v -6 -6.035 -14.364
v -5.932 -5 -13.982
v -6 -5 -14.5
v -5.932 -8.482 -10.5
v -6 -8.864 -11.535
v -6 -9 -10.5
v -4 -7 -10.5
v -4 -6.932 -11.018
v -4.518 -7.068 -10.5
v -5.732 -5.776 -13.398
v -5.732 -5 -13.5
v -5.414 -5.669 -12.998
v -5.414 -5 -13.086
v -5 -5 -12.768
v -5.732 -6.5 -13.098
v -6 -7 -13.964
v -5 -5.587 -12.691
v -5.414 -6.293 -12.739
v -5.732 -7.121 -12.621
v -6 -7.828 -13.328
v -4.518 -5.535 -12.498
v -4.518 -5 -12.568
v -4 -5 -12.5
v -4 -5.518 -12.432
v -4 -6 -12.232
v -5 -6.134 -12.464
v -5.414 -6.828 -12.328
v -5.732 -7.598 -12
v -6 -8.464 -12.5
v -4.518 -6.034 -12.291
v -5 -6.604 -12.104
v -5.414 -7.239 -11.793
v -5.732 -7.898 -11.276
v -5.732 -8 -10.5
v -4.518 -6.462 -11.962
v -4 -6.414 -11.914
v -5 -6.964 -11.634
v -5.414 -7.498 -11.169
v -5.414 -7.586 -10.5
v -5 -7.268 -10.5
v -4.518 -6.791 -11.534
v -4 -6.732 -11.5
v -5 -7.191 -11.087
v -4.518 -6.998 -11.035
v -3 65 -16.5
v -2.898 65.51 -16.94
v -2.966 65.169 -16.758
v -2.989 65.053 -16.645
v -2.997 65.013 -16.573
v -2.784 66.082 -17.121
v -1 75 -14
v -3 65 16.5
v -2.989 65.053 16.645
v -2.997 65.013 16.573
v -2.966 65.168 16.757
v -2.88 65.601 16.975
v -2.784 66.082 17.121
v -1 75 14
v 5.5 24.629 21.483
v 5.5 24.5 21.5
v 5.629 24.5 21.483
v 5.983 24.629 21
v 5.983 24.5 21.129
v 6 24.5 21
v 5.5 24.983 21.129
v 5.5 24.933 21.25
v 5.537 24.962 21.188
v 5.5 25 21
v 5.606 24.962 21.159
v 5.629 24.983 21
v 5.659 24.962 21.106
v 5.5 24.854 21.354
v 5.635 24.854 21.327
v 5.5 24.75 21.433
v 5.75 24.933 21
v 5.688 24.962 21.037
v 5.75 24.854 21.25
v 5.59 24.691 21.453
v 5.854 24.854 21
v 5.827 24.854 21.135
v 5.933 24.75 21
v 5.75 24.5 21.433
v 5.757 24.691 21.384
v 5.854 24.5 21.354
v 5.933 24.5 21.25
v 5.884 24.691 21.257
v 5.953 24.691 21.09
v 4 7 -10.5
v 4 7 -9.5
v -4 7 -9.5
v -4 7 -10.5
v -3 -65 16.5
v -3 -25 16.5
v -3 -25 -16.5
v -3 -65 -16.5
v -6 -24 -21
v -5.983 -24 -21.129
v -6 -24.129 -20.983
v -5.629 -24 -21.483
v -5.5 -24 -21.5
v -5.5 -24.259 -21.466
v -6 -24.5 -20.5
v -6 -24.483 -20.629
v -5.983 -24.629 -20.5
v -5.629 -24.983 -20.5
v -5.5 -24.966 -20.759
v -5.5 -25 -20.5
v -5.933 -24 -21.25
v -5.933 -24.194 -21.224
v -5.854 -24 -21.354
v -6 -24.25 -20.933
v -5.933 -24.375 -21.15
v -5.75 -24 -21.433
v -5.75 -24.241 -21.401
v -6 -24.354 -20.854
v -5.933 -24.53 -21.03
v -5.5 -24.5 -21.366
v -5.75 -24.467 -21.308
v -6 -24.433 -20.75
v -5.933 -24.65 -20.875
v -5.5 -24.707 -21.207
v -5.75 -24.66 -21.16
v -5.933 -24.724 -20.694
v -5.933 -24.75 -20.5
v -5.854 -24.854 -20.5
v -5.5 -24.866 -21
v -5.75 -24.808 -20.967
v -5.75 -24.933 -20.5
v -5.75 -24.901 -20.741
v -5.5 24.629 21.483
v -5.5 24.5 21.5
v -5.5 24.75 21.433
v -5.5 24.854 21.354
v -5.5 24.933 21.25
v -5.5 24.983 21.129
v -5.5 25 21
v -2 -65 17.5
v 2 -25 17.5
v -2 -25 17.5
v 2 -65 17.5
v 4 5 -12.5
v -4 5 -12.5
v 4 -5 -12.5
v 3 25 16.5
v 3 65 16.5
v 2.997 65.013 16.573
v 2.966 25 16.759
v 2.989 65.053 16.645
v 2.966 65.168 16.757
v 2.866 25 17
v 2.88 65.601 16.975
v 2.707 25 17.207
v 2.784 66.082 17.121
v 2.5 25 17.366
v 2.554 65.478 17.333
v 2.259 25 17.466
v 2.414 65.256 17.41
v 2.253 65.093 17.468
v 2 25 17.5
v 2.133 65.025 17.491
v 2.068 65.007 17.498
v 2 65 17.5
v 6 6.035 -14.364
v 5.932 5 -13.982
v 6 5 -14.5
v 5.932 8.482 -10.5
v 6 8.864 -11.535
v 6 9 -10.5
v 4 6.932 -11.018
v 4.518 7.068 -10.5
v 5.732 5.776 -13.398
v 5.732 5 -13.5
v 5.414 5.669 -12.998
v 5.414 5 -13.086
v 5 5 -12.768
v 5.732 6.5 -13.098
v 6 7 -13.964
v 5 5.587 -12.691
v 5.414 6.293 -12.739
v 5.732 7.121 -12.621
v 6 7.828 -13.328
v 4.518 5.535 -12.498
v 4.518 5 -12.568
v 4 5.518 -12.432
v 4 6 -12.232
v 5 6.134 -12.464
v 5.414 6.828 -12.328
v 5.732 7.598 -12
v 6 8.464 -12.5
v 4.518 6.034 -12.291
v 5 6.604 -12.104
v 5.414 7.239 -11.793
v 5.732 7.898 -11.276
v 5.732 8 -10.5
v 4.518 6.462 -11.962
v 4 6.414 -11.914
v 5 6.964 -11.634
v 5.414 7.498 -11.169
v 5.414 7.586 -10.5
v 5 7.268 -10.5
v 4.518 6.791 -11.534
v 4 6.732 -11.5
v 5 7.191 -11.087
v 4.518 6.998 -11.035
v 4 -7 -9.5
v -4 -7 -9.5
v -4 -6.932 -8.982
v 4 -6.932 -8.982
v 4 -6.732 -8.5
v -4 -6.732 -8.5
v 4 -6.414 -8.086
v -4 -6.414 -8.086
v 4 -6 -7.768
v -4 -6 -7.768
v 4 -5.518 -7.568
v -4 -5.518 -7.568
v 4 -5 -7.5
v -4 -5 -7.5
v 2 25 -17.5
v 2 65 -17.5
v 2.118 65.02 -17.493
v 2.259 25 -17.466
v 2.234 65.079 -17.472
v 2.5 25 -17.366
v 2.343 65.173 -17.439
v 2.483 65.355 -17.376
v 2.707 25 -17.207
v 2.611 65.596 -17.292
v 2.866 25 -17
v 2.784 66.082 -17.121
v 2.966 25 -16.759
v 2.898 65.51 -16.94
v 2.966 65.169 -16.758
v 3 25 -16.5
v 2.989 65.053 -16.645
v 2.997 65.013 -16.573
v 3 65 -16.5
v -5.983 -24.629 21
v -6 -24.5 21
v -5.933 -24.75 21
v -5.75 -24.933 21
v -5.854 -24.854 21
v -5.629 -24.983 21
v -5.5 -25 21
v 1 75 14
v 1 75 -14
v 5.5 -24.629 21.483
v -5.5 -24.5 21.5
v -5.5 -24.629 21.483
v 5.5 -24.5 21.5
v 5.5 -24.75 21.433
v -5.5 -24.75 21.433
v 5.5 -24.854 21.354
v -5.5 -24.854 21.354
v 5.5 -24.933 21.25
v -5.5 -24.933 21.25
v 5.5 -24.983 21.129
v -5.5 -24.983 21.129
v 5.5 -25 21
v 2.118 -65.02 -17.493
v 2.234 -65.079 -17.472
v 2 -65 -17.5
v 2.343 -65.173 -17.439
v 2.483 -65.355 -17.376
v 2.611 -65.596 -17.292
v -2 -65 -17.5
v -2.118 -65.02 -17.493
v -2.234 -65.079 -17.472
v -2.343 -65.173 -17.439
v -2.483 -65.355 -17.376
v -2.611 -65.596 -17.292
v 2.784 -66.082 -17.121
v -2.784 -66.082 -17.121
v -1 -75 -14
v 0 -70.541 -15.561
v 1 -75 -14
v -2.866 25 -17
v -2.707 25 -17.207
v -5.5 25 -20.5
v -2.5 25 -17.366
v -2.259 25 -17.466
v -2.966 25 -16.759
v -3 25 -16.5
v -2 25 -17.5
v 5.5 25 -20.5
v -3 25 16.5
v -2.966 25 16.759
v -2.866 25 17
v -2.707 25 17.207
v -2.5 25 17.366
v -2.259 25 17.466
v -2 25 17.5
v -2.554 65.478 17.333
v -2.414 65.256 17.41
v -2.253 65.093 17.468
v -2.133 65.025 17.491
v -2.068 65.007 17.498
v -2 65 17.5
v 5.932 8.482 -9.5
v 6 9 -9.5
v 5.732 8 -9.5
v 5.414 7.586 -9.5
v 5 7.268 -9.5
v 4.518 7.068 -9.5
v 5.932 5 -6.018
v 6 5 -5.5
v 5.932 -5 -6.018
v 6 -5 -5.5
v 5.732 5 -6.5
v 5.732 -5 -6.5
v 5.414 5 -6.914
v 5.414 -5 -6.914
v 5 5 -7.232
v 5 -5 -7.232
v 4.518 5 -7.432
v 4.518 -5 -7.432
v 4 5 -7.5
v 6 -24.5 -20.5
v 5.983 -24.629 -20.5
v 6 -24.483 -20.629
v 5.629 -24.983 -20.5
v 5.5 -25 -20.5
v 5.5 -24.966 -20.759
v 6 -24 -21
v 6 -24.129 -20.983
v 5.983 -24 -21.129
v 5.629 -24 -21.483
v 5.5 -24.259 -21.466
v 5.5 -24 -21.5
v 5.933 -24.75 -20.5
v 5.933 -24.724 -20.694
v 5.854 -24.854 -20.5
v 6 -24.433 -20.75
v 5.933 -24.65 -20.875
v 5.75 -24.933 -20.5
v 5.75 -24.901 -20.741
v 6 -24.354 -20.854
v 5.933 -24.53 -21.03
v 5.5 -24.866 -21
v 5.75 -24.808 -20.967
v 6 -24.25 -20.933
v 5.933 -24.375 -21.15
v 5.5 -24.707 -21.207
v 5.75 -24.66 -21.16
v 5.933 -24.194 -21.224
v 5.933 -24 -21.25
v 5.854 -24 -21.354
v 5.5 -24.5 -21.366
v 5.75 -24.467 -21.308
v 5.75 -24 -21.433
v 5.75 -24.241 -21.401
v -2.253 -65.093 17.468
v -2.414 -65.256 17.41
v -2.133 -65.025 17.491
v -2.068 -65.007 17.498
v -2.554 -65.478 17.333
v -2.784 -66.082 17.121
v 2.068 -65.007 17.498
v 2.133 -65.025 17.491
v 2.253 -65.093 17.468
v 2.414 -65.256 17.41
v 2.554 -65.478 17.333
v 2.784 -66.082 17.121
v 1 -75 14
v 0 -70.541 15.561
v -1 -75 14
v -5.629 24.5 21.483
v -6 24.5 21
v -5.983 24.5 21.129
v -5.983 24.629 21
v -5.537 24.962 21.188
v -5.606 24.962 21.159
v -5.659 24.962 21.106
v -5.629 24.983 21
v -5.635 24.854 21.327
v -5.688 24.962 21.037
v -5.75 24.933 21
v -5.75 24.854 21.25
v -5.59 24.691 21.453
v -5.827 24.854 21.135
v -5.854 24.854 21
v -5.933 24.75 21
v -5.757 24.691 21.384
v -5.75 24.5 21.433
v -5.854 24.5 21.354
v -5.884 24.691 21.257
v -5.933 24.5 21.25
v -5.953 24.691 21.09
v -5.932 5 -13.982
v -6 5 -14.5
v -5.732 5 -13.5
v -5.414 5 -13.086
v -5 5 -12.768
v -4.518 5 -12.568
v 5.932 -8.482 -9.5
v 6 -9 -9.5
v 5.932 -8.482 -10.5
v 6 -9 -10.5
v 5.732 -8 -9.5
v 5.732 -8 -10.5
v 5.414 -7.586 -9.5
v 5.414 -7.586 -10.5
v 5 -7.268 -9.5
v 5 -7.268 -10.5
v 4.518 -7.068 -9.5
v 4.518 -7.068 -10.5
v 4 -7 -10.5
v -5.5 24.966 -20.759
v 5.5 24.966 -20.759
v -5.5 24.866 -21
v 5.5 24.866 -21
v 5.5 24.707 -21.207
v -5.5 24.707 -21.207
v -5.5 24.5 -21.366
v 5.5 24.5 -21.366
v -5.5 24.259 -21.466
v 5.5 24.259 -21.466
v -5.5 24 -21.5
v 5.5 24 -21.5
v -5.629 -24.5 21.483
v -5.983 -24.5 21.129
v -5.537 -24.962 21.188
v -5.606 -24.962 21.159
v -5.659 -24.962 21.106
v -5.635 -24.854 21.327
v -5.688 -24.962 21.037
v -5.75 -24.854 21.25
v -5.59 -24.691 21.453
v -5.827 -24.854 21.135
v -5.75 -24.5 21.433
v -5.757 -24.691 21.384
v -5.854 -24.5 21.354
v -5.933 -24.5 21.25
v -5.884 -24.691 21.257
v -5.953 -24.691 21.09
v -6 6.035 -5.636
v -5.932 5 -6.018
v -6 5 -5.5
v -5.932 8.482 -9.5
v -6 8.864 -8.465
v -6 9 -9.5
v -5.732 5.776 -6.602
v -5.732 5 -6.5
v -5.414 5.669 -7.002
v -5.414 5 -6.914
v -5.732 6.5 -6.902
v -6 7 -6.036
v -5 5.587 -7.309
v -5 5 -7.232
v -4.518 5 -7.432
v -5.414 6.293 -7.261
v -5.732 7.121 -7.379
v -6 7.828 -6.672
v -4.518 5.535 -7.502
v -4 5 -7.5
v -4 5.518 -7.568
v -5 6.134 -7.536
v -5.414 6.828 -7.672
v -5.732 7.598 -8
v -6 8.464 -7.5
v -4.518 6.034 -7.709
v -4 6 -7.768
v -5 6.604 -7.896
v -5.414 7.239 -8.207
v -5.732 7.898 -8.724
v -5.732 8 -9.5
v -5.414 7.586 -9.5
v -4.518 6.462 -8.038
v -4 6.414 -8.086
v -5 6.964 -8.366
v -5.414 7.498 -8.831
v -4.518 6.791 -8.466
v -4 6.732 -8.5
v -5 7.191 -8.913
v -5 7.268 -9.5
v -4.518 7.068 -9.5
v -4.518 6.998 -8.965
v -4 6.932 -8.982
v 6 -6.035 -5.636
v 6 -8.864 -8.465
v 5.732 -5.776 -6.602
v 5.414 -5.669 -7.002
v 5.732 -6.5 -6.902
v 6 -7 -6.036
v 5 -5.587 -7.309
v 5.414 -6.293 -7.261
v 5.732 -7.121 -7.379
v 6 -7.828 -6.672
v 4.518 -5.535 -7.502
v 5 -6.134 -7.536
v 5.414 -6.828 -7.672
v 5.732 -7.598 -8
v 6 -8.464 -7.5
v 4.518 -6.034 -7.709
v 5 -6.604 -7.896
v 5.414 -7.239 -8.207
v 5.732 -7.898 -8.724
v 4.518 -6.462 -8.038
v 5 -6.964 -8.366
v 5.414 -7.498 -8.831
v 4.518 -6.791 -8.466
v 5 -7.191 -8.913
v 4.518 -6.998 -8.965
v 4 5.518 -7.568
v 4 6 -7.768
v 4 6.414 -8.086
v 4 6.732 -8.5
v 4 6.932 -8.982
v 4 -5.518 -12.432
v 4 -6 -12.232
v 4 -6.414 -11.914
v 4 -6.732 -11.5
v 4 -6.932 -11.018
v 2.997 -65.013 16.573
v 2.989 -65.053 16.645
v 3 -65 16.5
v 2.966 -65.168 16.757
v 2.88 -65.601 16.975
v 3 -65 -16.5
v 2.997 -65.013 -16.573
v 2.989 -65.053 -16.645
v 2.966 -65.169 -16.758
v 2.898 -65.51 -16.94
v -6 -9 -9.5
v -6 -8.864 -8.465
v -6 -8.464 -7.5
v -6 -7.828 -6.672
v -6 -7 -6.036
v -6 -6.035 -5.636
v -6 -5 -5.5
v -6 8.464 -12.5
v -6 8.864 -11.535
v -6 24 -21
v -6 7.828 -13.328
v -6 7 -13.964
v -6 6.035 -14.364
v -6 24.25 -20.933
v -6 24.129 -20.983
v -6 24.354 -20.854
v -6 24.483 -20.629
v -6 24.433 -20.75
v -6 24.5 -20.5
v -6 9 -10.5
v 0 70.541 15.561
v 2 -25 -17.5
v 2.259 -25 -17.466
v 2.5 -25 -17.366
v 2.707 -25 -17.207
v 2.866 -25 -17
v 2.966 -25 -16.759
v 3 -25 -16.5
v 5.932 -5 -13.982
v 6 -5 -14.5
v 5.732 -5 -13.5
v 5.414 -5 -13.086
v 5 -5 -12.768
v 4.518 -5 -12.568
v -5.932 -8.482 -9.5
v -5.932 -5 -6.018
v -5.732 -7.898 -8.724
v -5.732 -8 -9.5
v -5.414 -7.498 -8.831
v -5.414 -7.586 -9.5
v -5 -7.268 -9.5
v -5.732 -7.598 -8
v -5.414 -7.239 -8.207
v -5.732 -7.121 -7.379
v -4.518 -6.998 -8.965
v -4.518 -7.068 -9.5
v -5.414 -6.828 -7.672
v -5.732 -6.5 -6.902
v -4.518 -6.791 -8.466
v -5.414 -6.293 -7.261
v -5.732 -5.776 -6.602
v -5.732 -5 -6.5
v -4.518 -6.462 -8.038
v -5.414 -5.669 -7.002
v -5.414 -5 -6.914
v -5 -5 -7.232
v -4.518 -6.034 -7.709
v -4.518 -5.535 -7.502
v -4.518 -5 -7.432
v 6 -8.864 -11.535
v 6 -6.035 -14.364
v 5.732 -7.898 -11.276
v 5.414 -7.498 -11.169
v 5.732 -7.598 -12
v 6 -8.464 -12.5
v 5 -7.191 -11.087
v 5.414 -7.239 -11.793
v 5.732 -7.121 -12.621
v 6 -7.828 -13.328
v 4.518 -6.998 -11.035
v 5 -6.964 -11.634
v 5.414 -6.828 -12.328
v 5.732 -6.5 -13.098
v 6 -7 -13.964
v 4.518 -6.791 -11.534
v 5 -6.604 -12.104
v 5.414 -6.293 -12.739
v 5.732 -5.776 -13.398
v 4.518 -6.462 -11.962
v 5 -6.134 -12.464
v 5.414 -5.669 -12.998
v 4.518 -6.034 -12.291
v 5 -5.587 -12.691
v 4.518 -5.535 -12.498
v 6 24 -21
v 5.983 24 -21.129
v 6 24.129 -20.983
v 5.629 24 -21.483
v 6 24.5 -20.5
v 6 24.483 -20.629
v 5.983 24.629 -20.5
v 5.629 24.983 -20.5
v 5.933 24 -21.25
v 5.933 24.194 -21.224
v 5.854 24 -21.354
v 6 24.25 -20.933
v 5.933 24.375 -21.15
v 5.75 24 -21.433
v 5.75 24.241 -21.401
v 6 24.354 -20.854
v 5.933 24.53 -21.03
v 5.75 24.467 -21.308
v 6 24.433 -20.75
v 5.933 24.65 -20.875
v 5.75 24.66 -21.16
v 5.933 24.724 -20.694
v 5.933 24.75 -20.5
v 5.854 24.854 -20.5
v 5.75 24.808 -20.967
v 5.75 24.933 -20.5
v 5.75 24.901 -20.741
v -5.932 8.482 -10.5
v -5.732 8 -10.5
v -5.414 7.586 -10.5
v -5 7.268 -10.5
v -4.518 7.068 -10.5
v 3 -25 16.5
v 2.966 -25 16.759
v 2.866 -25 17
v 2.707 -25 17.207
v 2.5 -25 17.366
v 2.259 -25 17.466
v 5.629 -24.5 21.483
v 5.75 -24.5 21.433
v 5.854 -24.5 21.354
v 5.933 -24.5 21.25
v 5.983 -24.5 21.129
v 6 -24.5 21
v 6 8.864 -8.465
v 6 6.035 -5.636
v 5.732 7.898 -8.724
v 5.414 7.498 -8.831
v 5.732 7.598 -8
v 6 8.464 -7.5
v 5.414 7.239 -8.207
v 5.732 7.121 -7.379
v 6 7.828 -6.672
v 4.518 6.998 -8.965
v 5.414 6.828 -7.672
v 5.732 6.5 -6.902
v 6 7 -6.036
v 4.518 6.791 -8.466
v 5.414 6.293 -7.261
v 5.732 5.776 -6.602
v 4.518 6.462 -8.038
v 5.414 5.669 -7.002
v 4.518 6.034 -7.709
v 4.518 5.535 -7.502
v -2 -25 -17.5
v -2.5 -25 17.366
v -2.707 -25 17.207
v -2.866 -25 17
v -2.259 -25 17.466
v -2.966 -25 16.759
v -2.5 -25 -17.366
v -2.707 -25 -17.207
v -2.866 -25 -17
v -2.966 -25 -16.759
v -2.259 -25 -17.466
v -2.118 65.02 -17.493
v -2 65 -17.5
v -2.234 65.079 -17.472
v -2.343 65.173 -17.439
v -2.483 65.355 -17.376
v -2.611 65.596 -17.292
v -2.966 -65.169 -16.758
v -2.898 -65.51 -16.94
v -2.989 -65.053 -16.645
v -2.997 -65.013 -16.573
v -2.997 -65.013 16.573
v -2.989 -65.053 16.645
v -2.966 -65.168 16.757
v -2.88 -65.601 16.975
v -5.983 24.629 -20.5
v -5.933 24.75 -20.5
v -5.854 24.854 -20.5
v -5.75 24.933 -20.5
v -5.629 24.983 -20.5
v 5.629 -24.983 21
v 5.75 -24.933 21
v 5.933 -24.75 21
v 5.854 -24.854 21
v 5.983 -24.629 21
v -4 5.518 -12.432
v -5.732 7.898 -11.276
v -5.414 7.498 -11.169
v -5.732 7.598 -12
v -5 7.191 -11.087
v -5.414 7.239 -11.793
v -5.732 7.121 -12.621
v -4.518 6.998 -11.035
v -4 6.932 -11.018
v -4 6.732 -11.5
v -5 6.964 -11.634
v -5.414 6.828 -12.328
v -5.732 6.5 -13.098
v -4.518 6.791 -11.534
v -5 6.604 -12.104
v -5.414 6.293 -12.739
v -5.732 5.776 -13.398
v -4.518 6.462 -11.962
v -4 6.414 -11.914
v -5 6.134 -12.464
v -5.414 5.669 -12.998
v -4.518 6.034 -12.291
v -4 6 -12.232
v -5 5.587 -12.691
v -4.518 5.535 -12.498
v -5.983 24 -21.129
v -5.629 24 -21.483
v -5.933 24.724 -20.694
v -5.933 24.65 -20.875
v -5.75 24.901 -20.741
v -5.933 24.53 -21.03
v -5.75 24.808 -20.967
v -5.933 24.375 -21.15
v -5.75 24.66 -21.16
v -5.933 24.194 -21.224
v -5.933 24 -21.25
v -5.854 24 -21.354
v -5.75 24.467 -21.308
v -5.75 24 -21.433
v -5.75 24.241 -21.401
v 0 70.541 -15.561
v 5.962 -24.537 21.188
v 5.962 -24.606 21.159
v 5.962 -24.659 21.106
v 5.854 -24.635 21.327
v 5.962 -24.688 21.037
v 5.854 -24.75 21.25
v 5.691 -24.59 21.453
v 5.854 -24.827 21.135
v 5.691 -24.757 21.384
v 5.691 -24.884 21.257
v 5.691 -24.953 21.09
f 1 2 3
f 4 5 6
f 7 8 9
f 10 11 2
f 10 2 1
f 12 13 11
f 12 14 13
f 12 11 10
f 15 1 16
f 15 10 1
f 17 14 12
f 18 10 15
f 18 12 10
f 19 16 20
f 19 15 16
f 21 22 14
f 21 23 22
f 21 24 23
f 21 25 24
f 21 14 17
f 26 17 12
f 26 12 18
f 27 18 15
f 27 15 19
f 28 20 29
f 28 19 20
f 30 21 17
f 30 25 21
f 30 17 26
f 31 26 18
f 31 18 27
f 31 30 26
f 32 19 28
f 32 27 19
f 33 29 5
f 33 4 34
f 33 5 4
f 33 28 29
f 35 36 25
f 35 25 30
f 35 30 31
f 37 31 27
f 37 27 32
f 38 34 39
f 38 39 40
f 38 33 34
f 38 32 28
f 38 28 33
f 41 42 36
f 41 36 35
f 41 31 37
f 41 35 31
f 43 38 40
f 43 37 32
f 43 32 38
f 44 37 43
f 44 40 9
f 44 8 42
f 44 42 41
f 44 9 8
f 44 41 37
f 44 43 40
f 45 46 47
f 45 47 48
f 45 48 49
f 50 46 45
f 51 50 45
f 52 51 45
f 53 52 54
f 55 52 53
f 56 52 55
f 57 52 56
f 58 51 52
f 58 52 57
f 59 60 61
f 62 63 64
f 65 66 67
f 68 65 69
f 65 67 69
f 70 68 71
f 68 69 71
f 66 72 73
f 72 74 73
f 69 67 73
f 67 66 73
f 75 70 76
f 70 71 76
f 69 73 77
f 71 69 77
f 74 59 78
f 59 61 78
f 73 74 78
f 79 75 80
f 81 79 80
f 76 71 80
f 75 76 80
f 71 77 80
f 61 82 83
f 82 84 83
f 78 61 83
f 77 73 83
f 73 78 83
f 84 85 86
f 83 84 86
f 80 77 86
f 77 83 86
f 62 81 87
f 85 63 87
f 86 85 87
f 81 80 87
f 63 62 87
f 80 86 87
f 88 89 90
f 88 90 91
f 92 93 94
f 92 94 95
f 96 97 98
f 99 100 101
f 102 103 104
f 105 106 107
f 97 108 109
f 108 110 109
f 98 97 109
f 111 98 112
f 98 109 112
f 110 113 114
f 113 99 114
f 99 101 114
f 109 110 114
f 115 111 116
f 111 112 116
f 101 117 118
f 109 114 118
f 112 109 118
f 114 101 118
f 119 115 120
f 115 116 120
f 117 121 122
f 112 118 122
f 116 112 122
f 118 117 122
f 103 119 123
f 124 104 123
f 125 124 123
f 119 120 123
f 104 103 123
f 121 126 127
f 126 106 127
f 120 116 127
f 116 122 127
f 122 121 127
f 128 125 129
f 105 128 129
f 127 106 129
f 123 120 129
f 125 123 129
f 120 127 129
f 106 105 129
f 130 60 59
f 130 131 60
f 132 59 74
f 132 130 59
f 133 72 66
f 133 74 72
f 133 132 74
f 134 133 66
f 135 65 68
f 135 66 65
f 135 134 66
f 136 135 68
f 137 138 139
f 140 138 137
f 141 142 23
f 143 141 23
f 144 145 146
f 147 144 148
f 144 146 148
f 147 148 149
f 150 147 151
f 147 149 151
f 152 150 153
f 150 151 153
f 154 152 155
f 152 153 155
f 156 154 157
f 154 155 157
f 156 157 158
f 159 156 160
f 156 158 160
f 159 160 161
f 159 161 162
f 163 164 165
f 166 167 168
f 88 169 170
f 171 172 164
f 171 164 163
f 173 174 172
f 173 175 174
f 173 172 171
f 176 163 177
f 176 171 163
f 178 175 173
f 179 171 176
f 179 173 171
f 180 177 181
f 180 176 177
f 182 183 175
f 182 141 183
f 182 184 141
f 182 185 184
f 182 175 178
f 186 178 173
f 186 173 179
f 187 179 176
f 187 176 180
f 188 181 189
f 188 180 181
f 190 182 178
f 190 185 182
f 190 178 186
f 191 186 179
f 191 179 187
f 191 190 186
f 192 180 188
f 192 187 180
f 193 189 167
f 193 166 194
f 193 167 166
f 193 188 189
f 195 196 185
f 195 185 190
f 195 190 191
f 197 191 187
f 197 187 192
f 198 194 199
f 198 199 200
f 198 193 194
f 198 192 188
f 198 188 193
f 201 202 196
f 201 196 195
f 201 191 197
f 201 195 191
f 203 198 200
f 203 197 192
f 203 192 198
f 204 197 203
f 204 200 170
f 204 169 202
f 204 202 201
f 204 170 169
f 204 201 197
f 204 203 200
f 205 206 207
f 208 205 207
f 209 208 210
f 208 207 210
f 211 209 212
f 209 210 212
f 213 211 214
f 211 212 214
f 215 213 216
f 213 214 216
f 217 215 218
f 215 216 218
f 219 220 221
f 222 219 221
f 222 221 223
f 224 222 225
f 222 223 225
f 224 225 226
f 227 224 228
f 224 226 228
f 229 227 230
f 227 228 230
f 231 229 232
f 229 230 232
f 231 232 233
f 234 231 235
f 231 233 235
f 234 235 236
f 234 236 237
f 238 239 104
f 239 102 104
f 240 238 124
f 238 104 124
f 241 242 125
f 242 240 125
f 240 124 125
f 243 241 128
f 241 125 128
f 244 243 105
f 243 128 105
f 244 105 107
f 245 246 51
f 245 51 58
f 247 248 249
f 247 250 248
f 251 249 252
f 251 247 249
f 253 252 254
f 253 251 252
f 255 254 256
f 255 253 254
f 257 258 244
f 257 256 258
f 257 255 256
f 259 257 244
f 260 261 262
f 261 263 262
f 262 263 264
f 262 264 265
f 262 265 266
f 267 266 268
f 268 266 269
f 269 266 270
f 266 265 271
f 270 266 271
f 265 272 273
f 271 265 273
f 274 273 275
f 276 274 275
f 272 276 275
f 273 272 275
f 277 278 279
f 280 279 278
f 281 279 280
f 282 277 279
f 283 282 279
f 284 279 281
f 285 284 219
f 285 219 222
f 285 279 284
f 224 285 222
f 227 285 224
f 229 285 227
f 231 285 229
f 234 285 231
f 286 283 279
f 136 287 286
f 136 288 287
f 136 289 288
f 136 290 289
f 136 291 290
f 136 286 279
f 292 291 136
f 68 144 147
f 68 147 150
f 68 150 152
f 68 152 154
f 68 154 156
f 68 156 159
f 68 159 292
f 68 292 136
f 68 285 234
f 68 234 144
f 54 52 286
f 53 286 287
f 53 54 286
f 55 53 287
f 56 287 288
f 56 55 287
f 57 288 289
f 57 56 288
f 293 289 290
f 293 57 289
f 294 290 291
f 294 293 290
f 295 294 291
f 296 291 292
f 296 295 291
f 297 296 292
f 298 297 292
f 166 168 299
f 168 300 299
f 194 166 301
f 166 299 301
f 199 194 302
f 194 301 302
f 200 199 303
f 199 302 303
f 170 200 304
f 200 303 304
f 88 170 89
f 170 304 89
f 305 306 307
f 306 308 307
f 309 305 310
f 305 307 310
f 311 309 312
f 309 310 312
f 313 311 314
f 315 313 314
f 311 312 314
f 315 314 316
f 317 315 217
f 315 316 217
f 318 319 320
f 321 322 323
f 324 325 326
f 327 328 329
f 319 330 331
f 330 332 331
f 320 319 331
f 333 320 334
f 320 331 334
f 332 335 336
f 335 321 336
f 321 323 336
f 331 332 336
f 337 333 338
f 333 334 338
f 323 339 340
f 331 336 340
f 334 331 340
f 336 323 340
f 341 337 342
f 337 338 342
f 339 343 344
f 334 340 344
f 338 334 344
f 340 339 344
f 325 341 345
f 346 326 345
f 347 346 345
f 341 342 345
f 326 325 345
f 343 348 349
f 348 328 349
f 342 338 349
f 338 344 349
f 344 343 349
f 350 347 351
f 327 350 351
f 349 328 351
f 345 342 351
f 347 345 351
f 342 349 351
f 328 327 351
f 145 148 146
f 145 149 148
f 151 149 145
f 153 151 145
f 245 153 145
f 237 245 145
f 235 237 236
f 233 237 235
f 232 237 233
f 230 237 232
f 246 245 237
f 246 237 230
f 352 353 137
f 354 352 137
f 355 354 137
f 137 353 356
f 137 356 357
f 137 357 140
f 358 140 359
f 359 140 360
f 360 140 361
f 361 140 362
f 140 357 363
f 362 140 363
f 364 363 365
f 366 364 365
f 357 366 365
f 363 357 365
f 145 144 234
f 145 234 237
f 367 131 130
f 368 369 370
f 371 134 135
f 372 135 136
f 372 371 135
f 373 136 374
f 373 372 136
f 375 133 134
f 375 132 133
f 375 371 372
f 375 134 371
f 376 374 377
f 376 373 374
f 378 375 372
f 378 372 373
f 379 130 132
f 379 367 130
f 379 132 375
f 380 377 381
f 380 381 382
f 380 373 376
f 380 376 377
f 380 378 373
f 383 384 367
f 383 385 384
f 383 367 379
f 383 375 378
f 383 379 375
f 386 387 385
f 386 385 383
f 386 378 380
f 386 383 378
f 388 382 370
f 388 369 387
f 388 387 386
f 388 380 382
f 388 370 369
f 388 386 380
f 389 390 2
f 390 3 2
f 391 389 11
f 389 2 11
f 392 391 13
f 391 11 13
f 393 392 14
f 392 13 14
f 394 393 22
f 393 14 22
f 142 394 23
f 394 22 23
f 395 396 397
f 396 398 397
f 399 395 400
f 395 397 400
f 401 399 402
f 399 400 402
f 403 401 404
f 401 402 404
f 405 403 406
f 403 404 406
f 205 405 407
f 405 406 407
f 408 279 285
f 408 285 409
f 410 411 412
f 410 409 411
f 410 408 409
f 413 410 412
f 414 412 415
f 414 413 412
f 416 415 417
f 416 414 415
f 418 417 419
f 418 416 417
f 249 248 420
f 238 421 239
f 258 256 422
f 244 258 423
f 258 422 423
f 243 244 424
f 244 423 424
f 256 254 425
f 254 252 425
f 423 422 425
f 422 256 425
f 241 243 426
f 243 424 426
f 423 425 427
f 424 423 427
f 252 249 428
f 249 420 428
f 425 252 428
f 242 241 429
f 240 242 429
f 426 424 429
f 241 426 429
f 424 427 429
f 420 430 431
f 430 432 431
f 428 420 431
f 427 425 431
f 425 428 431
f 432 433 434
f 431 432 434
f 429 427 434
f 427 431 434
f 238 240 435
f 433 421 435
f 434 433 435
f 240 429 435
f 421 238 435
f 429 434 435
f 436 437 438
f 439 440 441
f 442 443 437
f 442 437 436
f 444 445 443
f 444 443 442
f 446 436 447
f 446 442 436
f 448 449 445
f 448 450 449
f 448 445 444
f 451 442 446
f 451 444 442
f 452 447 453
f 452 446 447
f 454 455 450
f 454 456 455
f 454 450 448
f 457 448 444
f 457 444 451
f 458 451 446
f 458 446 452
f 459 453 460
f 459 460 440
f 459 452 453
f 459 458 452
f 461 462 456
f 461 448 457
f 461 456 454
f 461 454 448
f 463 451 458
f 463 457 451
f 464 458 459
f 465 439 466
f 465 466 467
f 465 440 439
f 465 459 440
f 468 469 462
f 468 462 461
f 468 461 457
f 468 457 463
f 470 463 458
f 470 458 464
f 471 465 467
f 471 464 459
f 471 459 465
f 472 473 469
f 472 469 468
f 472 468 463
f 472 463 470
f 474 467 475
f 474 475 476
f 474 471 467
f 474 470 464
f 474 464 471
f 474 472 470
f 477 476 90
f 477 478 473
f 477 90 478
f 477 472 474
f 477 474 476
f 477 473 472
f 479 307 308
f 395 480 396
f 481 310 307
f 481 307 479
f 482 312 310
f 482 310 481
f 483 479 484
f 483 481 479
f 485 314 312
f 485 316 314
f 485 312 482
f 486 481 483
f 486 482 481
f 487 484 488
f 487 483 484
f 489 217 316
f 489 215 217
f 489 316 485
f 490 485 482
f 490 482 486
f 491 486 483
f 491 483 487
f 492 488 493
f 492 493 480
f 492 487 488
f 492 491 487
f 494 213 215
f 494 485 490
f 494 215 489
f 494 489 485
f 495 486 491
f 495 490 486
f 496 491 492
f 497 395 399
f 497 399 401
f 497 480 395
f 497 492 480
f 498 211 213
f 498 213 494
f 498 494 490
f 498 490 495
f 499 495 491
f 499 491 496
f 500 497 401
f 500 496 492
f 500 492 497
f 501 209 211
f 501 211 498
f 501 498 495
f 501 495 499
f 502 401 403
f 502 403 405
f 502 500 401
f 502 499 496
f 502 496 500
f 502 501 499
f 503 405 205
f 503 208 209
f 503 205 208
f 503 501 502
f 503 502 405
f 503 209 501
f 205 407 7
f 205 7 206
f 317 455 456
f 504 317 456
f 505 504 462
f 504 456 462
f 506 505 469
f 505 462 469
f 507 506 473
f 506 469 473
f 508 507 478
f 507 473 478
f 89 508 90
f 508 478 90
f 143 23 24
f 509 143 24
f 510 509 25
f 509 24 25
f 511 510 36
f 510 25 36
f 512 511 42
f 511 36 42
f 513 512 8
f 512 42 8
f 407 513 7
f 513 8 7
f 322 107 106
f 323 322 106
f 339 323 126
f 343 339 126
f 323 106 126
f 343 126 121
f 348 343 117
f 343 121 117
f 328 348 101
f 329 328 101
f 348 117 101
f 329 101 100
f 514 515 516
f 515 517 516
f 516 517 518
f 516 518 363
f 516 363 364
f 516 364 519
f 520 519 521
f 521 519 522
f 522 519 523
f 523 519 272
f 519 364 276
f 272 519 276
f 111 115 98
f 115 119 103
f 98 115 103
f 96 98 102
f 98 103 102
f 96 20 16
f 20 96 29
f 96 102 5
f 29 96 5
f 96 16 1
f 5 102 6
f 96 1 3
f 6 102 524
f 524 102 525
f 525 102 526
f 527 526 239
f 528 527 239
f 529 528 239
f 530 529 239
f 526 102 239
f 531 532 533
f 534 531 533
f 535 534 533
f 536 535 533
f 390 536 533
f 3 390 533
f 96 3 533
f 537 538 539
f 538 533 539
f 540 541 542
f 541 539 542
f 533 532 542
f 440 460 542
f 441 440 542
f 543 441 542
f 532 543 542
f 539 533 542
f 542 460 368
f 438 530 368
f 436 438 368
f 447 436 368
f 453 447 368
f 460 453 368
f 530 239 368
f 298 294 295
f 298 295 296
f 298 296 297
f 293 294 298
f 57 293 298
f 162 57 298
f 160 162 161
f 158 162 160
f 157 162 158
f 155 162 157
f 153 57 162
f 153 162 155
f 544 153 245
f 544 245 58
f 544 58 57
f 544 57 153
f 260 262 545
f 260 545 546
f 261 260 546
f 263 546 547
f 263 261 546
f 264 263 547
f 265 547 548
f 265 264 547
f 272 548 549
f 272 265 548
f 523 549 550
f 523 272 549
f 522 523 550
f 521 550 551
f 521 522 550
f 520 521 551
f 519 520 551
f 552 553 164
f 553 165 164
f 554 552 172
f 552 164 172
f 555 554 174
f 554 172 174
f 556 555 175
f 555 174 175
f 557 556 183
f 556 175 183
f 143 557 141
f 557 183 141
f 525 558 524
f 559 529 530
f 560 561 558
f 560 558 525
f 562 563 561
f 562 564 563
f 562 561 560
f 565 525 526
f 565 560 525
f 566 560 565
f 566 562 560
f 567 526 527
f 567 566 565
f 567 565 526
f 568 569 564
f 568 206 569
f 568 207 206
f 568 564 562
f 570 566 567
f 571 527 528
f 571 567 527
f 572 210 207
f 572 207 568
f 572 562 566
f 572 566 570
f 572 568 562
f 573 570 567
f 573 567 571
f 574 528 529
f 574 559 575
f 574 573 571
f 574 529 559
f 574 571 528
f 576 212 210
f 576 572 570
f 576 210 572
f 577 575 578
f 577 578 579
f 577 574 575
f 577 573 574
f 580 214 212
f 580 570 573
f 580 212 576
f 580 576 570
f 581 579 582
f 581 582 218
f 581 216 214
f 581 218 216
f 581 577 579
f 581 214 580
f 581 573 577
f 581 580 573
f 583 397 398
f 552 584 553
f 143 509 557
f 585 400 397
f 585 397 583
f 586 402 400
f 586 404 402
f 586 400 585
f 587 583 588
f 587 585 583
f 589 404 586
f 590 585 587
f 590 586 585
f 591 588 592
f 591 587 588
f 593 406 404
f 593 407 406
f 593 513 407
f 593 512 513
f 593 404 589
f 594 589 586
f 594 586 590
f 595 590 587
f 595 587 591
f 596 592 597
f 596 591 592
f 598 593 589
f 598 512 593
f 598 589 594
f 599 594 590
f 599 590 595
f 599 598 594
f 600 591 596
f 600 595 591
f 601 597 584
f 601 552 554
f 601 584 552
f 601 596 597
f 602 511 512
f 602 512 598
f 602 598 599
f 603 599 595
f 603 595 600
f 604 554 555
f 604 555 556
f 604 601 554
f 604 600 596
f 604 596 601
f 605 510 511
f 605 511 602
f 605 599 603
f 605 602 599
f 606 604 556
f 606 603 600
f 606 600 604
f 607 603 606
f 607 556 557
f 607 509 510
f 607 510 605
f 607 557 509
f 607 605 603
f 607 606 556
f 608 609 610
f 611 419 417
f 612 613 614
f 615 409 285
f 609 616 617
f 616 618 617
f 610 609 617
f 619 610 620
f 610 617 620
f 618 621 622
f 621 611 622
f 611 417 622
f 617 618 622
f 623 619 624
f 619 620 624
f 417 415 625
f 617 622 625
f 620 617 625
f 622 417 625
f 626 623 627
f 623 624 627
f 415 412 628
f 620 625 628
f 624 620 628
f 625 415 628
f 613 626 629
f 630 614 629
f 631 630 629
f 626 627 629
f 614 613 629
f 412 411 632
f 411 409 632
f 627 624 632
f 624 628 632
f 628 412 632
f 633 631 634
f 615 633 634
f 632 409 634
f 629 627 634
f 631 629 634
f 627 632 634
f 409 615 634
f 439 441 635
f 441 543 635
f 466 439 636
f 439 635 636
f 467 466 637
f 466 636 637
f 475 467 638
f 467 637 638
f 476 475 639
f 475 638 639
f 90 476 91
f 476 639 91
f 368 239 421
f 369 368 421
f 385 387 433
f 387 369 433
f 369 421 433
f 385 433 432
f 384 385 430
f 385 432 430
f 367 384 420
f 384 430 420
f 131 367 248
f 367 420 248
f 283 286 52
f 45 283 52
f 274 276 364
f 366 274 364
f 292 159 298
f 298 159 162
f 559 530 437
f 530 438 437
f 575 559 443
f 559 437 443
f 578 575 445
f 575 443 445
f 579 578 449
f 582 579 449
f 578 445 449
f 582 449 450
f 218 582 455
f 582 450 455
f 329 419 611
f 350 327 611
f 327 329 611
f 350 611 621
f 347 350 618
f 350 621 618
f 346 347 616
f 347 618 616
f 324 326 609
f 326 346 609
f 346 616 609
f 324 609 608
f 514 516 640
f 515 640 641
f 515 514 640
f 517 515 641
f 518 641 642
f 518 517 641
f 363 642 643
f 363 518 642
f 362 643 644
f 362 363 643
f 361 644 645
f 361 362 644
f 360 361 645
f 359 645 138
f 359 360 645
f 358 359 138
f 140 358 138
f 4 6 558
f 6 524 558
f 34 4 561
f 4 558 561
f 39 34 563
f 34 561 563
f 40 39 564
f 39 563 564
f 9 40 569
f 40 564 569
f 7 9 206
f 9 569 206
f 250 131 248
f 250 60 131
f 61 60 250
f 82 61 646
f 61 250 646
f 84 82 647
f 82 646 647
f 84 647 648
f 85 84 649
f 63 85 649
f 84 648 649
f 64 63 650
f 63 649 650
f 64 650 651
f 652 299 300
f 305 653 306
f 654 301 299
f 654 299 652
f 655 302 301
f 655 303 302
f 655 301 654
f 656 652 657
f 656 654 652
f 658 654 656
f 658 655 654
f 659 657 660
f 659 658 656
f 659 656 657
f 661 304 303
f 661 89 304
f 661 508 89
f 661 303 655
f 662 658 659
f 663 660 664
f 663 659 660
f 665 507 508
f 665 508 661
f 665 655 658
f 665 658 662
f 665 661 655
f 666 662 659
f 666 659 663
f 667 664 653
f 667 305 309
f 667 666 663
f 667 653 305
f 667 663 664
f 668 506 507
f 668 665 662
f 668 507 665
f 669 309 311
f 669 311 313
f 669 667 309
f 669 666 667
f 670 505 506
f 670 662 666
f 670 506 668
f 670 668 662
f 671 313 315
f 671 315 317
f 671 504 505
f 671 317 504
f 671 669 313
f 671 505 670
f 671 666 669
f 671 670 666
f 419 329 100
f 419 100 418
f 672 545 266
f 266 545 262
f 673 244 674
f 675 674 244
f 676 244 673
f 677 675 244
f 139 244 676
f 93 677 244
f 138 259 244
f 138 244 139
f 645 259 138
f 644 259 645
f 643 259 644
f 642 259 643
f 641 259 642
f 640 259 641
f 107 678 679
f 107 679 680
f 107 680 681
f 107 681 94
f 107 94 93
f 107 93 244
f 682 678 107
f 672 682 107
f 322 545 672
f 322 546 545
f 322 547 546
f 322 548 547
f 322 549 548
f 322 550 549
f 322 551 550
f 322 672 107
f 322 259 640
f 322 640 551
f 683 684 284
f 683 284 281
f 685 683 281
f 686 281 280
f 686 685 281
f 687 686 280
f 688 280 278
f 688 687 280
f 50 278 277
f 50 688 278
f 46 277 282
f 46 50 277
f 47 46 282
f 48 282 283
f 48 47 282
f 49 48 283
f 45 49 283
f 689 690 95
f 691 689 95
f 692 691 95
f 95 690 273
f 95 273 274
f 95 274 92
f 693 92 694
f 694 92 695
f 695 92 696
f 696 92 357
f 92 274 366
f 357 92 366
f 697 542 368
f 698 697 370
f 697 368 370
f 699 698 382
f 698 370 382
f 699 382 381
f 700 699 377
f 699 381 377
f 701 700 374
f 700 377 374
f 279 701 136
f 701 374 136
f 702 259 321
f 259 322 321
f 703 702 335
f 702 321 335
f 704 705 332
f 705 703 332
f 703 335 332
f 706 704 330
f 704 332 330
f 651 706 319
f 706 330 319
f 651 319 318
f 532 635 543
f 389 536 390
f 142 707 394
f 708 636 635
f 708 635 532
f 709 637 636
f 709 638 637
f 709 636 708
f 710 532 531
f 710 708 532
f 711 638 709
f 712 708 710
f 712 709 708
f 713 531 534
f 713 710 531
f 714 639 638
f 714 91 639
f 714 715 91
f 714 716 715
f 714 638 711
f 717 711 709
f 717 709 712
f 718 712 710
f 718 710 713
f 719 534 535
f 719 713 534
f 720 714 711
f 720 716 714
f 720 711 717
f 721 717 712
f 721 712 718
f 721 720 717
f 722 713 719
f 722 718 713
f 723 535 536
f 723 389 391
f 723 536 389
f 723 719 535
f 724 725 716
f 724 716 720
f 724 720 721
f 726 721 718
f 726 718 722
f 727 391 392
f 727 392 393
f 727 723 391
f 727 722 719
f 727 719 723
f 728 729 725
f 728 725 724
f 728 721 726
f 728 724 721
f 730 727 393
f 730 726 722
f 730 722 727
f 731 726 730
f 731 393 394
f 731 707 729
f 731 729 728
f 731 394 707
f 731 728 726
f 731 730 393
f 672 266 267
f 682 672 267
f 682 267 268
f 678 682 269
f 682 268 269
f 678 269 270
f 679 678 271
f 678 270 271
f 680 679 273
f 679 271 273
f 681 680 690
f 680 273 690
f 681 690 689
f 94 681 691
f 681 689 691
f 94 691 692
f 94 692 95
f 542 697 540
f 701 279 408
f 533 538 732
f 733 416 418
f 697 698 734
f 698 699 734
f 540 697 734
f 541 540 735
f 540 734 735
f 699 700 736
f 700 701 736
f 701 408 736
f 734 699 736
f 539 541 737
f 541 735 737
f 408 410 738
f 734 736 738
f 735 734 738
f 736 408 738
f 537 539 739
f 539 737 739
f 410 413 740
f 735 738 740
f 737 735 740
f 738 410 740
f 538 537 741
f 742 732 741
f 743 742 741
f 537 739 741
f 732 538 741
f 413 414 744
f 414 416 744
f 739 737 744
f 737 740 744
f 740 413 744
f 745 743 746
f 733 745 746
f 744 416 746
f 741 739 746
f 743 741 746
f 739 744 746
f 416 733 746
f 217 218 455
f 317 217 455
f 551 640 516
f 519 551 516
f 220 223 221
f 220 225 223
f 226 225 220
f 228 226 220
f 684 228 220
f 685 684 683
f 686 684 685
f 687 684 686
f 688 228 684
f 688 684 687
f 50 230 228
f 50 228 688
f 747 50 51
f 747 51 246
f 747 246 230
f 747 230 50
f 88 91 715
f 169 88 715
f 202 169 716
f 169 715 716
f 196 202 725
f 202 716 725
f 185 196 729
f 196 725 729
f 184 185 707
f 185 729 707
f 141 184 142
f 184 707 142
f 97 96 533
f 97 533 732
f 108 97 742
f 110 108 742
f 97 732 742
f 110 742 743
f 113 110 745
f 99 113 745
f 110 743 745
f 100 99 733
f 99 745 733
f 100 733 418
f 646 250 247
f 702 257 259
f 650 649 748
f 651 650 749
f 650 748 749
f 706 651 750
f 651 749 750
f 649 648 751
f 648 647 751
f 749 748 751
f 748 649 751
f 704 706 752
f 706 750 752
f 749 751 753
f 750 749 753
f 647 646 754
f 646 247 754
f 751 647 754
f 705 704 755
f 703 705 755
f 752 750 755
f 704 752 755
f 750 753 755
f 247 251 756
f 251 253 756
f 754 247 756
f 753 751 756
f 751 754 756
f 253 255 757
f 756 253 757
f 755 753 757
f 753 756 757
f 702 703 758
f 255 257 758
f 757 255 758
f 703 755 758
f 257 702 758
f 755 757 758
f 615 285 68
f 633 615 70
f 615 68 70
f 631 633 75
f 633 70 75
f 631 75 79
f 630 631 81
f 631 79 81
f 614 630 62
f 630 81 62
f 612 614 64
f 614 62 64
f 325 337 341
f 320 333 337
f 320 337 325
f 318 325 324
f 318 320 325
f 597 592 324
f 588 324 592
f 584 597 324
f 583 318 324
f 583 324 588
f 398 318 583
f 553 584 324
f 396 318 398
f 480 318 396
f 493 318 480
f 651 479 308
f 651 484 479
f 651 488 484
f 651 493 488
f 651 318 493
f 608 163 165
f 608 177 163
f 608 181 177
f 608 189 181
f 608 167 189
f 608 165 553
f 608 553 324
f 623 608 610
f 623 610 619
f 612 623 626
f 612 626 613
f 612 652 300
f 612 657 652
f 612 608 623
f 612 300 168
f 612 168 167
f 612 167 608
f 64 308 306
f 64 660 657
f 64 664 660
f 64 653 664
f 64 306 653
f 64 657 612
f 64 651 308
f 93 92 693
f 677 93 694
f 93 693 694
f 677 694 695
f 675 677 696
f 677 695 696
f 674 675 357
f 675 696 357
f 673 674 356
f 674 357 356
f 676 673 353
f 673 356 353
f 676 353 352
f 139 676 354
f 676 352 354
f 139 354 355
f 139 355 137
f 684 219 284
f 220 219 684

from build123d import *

# Parameters (mm, degrees)
F0_W          = 75
F0_H          = 35
F1_DEPTH      = 3
F4_W          = 10.7173770666
F4_H          = 34.9826700985
F5_DEPTH      = 25
F7_W          = 6
F7_H          = 35
F7_W_2        = 2
F7_H_2        = 28
F8_DEPTH      = 10
F9_DEPTH      = 10
F9_FACE_W     = 6
F9_FACE_H     = 35
F11_W         = 2
F11_H         = 28
F14_DEPTH     = 6
F16_DEPTH     = 25
F17_R         = 2
F18_R         = 0.5
F20_T1_DEPTH  = 12
F20_T4_ANGLE  = 90
F20_T6_ANGLE  = 90
F20_T8_ANGLE  = 90
F20_T10_ANGLE = 90
F21_R         = 1


# Not quite as in the source:
# - a fillet or chamfer that OpenCascade refuses, or shapes differently, is made with other operations: its cross-section is extruded or revolved along the edge and cut away or added
# - a feature of the source that left no trace in its solid (it failed there, or was rolled back) is left out
# - a feature names something its author has since deleted; it is built from what else it names


with BuildPart() as f1:
    # F0 (on Right) → F1 (new body, symmetric)
    with BuildSketch(Plane.YZ):
        with Locations((37.5, 0)):
            Rectangle(F0_W, F0_H)
    extrude(amount=F1_DEPTH, both=True)

    # F4 (on offset) → F5 (cut)
    with BuildSketch(Plane.XZ.offset(-10)):
        Rectangle(F4_W, F4_H)
    extrude(amount=F5_DEPTH, mode=Mode.SUBTRACT)

    # F7 (on face) → F8 (cut)
    with BuildSketch(Plane(origin=(0, 75, 0), x_dir=(-1, 0, 0), z_dir=(0, 1, 0))):
        Rectangle(F7_W, F7_H)
        Rectangle(F7_W_2, F7_H_2, mode=Mode.SUBTRACT)
    extrude(amount=F8_DEPTH, mode=Mode.SUBTRACT)

    # F9 (cut): a face of the model
    f9_faces = [f1.faces().sort_by_distance(p)[0] for p in [
        (0, 75, 0),
    ]]
    extrude(f9_faces, amount=-F9_DEPTH, mode=Mode.SUBTRACT)

    # F9_face (on face) → F12 section 0
    with BuildSketch(Plane(origin=(0, 65, 0), x_dir=(-1, 0, 0), z_dir=(0, 1, 0))):
        Rectangle(F9_FACE_W, F9_FACE_H)
    # F11 (on offset) → F12 section 1
    with BuildSketch(Plane(origin=(0, 75, 0), x_dir=(-1, 0, 0), z_dir=(0, 1, 0))):
        Rectangle(F11_W, F11_H)
    loft()

    # F13 (on Right) → F14 (join, symmetric)
    with BuildSketch(Plane.YZ):
        Polygon((25, 21.5), (0, 21.5), (-25, 21.5), (-25, 0), (-25, -21.5), (0, -21.5), (25, -21.5), (25, 0), align=None)
    extrude(amount=F14_DEPTH, both=True)

    # F15 (on face) → F16 (cut)
    with BuildSketch(Plane(origin=(-6, 0, 0), x_dir=(0, -1, 0), z_dir=(-1, 0, 0))):
        with BuildLine():
            Line((-5, -12.5), (5, -12.5))
            ThreePointArc((5, -12.5), (6.4142135624, -11.9142135624), (7, -10.5))
            Line((7, -10.5), (7, -9.5))
            ThreePointArc((7, -9.5), (6.4142135624, -8.0857864376), (5, -7.5))
            Line((5, -7.5), (-5, -7.5))
            ThreePointArc((-5, -7.5), (-6.4142135624, -8.0857864376), (-7, -9.5))
            Line((-7, -9.5), (-7, -10.5))
            ThreePointArc((-7, -10.5), (-6.4142135624, -11.9142135624), (-5, -12.5))
        make_face()
    extrude(amount=-F16_DEPTH, mode=Mode.SUBTRACT)

    # F17
    f17_edges = [f1.edges().sort_by_distance(p)[0] for p in [
        (6, 0, -7.5),
        (6, -6.414214, -8.085786),
        (6, -7, -10),
        (6, -6.414214, -11.914214),
        (6, 0, -12.5),
        (6, 6.414214, -8.085786),
        (6, 7, -10),
        (6, 6.414214, -11.914214),
        (-6, 0, -7.5),
        (-6, -6.414214, -8.085786),
        (-6, -7, -10),
        (-6, -6.414214, -11.914214),
        (-6, 0, -12.5),
        (-6, 6.414214, -11.914214),
        (-6, 7, -10),
        (-6, 6.414214, -8.085786),
    ]]
    fillet(f17_edges, radius=F17_R)

    # F18
    f18_edges = [f1.edges().sort_by_distance(p)[0] for p in [
        (-6, 0, 21.5),
        (0, -25, 21.5),
        (6, 0, 21.5),
        (0, 25, 21.5),
        (6, 0, -5.5),
        (6, 7.828427, -6.671573),
        (6, -7.828427, -6.671573),
        (6, 9, -10),
        (6, -9, -10),
        (6, 7.828427, -13.328427),
        (6, -7.828427, -13.328427),
        (6, 0, -14.5),
        (6, -25, 0),
        (6, 25, 0),
        (6, 0, -21.5),
        (-6, 0, -5.5),
        (-6, -7.828427, -6.671573),
        (-6, 7.828427, -6.671573),
        (-6, -9, -10),
        (-6, 9, -10),
        (-6, -7.828427, -13.328427),
        (-6, 7.828427, -13.328427),
        (-6, 0, -14.5),
        (-6, 25, 0),
        (-6, -25, 0),
        (-6, 0, -21.5),
    ]]
    fillet(f18_edges, radius=F18_R)

    # F19: F1 across plane


with BuildPart() as f1_1:
    add(f1.part)
    add(f1.part.mirror(Plane.XZ))

    # F20: fillet of radius 1 on 2 edges, made by hand

    # F20_s2 → F20_t1 (cut)
    with BuildSketch(Plane.YZ.offset(-6)):
        with BuildLine():
            ThreePointArc((25, -20.5), (24.7071067812, -21.2071067812), (24, -21.5))
            Line((24, -21.5), (25, -21.5))
            Line((25, -21.5), (25, -20.5))
        make_face()
        with BuildLine():
            ThreePointArc((-25, -20.5), (-24.7071067812, -21.2071067812), (-24, -21.5))
            Line((-24, -21.5), (-25, -21.5))
            Line((-25, -21.5), (-25, -20.5))
        make_face()
    extrude(amount=F20_T1_DEPTH, mode=Mode.SUBTRACT)

    # F20_s3 → F20_t4 (revolve, cut)
    with BuildSketch(Plane.XZ.offset(24)):
        with BuildLine():
            ThreePointArc((-6, -21), (-5.8535533906, -21.3535533906), (-5.5, -21.5))
            Line((-5.5, -21.5), (-6, -21.5))
            Line((-6, -21.5), (-6, -21))
        make_face()
    revolve(axis=Axis((-6, -24, -20.5), (-1, 0, 0)), revolution_arc=F20_T4_ANGLE, mode=Mode.SUBTRACT)

    # F20_s5 → F20_t6 (revolve, cut)
    with BuildSketch(Plane.XY.offset(-20.5)):
        with BuildLine():
            ThreePointArc((6, -24.5), (5.8535533906, -24.8535533906), (5.5, -25))
            Line((5.5, -25), (6, -25))
            Line((6, -25), (6, -24.5))
        make_face()
    revolve(axis=Axis((6, -24, -20.5), (1, 0, 0)), revolution_arc=F20_T6_ANGLE, mode=Mode.SUBTRACT)

    # F20_s7 → F20_t8 (revolve, cut)
    with BuildSketch(Plane.XZ.offset(-24)):
        with BuildLine():
            ThreePointArc((6, -21), (5.8535533906, -21.3535533906), (5.5, -21.5))
            Line((5.5, -21.5), (6, -21.5))
            Line((6, -21.5), (6, -21))
        make_face()
    revolve(axis=Axis((6, 24, -20.5), (1, 0, 0)), revolution_arc=F20_T8_ANGLE, mode=Mode.SUBTRACT)

    # F20_s9 → F20_t10 (revolve, cut)
    with BuildSketch(Plane.XY.offset(-20.5)):
        with BuildLine():
            ThreePointArc((-6, 24.5), (-5.8535533906, 24.8535533906), (-5.5, 25))
            Line((-5.5, 25), (-6, 25))
            Line((-6, 25), (-6, 24.5))
        make_face()
    revolve(axis=Axis((-6, 24, -20.5), (-1, 0, 0)), revolution_arc=F20_T10_ANGLE, mode=Mode.SUBTRACT)

    # F21
    f21_edges = [f1_1.edges().sort_by_distance(p)[0] for p in [
        (3, 45, -17.5),
        (3, 45, 17.5),
        (-3, 45, 17.5),
        (-3, 45, -17.5),
        (-3, -45, 17.5),
        (-3, -45, -17.5),
        (3, -45, -17.5),
        (3, -45, 17.5),
    ]]
    fillet(f21_edges, radius=F21_R)


solid = f1_1.part
